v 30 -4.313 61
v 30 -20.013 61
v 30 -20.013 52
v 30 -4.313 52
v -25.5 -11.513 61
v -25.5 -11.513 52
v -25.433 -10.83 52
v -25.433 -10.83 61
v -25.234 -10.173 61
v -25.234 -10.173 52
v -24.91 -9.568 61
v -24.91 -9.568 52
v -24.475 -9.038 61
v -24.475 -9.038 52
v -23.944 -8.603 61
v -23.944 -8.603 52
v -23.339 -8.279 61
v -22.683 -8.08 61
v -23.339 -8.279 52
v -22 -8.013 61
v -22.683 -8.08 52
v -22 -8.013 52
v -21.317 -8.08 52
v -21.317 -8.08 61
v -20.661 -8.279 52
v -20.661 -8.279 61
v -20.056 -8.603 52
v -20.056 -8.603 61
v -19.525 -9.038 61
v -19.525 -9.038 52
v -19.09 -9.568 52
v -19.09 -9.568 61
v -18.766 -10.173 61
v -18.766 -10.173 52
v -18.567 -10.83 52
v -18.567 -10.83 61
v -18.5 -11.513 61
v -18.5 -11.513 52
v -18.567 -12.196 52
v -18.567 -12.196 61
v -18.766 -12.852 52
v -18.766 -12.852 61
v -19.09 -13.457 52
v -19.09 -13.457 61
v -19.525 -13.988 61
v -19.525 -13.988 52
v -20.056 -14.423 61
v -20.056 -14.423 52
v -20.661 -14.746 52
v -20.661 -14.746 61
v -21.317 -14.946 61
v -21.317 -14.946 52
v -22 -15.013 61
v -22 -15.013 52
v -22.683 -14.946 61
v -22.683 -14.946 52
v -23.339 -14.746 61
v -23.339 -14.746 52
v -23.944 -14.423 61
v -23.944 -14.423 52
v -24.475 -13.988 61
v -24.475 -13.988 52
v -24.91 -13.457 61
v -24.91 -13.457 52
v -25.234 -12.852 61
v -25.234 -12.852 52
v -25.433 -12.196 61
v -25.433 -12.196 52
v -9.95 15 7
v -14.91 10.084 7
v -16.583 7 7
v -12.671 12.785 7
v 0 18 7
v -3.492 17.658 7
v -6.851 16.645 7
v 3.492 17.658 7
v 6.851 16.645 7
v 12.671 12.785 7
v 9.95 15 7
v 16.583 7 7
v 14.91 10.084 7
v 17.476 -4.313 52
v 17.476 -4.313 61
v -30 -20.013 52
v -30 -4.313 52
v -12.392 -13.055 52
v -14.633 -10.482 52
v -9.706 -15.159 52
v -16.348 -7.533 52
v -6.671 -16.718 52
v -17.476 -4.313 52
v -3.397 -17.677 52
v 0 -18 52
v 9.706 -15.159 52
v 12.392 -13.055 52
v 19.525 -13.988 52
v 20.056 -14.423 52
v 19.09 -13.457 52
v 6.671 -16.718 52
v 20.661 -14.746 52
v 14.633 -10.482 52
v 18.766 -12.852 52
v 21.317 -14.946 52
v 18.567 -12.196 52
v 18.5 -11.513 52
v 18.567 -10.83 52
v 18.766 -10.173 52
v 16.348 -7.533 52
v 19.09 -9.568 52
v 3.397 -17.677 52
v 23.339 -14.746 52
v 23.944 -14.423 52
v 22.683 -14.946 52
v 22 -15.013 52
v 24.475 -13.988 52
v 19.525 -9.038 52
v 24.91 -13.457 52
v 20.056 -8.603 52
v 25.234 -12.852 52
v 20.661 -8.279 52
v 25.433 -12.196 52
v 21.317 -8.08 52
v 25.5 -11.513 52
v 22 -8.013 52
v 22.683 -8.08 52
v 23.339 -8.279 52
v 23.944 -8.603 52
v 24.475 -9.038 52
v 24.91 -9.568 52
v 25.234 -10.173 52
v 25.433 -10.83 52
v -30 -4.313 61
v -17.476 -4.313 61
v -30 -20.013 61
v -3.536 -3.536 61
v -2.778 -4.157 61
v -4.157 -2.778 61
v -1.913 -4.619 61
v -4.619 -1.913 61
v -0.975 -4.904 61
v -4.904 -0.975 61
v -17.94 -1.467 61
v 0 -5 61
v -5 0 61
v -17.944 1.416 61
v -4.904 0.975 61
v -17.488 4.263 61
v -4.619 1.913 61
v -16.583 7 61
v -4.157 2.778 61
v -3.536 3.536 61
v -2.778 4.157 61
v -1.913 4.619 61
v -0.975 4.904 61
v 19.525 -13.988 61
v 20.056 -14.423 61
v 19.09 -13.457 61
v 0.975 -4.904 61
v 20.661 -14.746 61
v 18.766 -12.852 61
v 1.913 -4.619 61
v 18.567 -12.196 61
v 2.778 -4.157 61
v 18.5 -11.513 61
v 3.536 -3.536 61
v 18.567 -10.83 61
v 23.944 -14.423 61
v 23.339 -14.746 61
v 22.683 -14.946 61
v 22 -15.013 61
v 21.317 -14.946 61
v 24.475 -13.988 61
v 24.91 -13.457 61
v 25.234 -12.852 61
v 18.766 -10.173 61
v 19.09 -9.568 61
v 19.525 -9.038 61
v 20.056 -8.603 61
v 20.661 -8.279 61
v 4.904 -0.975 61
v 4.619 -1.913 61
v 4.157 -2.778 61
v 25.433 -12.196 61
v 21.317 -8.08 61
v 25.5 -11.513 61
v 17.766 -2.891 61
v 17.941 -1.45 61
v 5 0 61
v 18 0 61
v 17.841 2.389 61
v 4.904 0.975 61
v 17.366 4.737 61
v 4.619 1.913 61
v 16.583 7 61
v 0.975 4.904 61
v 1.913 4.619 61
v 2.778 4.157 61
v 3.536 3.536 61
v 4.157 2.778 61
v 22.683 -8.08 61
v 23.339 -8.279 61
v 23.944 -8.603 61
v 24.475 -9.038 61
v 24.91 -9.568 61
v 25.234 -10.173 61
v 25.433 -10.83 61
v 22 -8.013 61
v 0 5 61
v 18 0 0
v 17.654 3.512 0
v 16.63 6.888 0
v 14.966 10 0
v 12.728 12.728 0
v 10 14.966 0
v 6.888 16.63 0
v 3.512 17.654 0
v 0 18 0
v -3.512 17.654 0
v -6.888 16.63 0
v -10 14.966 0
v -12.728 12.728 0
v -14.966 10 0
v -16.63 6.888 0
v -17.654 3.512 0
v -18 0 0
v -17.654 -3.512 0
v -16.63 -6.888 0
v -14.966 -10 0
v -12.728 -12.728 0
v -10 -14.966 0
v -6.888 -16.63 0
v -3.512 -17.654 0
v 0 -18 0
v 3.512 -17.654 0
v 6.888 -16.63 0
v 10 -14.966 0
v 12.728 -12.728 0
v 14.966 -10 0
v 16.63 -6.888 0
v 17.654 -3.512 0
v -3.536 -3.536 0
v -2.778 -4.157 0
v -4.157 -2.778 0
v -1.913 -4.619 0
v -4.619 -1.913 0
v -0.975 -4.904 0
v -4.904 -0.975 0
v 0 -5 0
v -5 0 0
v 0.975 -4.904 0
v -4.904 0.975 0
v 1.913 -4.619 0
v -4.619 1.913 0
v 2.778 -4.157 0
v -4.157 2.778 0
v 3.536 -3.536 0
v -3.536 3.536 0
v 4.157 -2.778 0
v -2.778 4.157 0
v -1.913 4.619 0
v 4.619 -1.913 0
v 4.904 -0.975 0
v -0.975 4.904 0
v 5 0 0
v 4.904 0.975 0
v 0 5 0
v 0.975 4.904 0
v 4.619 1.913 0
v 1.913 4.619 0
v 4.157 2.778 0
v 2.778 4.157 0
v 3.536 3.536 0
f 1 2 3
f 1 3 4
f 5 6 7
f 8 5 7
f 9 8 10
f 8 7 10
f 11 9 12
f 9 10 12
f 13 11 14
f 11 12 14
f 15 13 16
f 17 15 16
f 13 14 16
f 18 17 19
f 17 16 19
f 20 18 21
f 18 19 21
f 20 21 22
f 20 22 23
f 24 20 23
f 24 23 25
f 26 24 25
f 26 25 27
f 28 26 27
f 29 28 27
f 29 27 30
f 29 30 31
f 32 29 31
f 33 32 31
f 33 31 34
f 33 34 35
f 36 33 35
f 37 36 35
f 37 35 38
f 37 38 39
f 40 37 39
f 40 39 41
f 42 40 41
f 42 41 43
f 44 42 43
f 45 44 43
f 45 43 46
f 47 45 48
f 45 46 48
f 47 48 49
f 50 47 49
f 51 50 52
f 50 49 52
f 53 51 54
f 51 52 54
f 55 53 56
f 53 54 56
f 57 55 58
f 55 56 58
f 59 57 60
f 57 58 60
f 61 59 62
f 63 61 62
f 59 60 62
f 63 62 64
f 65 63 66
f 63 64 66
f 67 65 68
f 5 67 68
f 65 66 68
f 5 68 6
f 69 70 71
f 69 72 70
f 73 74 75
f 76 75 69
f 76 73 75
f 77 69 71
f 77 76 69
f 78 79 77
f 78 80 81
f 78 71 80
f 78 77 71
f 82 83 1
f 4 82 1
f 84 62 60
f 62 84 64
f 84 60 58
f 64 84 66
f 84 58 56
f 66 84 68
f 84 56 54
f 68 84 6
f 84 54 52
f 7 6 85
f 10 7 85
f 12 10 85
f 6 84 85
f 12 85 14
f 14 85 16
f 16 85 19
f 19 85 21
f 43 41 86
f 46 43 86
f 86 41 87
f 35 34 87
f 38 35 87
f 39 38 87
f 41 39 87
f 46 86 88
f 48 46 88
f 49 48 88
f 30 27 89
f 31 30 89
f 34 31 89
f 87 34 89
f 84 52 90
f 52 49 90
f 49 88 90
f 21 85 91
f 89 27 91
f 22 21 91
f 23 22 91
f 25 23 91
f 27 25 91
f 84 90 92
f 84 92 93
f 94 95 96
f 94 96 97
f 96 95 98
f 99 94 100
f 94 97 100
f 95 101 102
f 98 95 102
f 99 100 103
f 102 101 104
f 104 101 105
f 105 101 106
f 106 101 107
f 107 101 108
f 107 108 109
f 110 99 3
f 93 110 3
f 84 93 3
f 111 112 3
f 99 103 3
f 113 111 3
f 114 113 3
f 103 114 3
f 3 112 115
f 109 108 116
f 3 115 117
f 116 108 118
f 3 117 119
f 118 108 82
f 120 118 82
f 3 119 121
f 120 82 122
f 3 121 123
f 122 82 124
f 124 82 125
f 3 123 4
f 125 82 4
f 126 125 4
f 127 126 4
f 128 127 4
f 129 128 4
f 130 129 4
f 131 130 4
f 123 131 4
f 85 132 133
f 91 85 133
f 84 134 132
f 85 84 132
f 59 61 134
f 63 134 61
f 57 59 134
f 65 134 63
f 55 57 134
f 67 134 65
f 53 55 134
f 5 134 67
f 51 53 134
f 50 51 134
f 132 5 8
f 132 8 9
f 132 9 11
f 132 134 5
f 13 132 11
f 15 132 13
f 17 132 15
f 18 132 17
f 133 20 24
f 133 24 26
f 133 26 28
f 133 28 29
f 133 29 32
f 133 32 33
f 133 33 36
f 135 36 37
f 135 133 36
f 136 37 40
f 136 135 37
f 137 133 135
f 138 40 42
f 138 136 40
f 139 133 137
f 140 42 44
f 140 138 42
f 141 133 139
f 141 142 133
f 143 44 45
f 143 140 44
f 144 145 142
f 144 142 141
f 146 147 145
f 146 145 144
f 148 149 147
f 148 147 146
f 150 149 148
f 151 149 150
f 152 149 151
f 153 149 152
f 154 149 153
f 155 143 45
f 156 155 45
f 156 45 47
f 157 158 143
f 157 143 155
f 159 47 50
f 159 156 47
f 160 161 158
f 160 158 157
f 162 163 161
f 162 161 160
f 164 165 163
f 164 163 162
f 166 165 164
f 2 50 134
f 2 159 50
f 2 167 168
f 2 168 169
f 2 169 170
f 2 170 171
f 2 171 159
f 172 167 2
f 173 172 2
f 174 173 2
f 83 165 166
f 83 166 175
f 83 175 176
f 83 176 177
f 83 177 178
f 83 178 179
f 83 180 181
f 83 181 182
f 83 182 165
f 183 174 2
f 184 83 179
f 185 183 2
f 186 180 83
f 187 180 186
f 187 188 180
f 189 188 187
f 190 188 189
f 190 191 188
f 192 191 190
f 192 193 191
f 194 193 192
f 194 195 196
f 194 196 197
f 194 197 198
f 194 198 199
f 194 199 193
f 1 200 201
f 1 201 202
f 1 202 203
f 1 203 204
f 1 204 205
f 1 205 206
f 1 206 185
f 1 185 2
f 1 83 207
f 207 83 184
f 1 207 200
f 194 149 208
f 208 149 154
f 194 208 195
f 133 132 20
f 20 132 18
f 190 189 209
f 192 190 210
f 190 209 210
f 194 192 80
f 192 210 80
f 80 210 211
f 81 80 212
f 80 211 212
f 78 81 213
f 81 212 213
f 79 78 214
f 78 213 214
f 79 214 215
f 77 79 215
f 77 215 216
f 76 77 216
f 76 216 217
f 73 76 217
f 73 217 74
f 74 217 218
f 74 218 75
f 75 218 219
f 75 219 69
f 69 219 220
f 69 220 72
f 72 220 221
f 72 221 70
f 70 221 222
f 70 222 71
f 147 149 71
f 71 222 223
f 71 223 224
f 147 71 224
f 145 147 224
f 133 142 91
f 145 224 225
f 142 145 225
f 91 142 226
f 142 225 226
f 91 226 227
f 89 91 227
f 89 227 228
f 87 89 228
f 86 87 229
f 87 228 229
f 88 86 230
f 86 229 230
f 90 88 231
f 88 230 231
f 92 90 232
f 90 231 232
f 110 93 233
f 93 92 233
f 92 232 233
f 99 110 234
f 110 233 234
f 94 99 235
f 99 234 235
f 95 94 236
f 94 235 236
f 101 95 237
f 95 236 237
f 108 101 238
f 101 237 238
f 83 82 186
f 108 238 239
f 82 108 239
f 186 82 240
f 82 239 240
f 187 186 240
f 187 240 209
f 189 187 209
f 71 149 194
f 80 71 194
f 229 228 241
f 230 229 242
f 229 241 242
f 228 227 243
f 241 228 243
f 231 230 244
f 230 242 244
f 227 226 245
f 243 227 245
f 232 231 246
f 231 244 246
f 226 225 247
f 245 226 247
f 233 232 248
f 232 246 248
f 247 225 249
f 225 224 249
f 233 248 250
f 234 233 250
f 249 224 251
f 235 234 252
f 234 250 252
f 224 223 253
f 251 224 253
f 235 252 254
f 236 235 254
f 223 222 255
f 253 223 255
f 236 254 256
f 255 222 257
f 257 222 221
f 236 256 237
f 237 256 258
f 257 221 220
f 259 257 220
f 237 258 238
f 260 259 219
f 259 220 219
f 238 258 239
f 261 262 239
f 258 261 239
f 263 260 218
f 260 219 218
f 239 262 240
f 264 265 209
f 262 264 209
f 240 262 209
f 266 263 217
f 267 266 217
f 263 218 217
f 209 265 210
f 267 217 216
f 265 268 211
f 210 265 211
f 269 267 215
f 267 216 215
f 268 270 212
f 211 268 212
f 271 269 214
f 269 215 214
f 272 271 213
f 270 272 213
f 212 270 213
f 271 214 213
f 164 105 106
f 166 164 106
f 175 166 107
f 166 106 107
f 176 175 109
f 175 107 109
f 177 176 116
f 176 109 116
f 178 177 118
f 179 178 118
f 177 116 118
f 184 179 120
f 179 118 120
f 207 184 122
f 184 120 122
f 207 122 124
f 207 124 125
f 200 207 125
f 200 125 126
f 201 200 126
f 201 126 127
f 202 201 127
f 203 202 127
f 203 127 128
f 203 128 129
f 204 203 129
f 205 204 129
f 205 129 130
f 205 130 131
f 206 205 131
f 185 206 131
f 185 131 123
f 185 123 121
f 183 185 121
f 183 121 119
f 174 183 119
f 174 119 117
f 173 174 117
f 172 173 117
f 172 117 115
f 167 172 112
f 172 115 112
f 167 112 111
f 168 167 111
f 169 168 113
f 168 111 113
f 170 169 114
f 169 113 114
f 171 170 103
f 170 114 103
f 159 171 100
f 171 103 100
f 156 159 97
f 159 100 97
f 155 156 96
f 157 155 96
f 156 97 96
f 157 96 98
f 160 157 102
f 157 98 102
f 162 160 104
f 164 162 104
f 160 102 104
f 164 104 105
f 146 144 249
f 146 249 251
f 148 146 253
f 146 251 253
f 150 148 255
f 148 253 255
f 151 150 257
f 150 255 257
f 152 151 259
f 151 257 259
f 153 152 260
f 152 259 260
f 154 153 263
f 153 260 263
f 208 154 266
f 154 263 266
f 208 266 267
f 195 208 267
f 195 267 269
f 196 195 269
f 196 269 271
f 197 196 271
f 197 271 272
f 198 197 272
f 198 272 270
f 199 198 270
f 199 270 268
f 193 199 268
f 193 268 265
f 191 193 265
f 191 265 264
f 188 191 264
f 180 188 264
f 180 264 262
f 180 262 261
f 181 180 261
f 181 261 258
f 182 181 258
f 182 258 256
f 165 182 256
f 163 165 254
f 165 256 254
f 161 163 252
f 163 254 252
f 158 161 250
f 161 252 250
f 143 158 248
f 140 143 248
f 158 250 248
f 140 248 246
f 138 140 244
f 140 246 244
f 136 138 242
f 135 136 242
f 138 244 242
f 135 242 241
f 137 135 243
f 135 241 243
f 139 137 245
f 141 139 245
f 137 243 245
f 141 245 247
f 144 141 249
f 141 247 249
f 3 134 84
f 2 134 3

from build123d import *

# Parameters (mm, degrees)
SKETCH1_R           = 18
BOSS_EXTRUDE1_DEPTH = 61
SKETCH2_W           = 39.528935746
SKETCH2_H           = 14.130439677
CUT_EXTRUDE1_DEPTH  = 54
SKETCH3_W           = 60
SKETCH3_H           = 15.7
BOSS_EXTRUDE2_DEPTH = 9
SKETCH4_R           = 3.5
CUT_EXTRUDE2_DEPTH  = 10
LPATTERN1_COUNT     = 2
LPATTERN1_PITCH     = 44
SKETCH6_R           = 5
CUT_EXTRUDE3_DEPTH  = 100


with BuildPart() as part:
    # Sketch1 → Boss-Extrude1 (new body)
    with BuildSketch(Plane.XY):
        Circle(SKETCH1_R)
    extrude(amount=BOSS_EXTRUDE1_DEPTH)

    # Sketch2 → Cut-Extrude1 (cut)
    with BuildSketch(Plane.XY.offset(61)):
        with Locations((2.474682956, 14.065219839)):
            Rectangle(SKETCH2_W, SKETCH2_H)
    extrude(amount=-CUT_EXTRUDE1_DEPTH, mode=Mode.SUBTRACT)

    # Sketch3 → Boss-Extrude2 (add)
    with BuildSketch(Plane.XY.offset(61)):
        with Locations((0, -12.16286005)):
            Rectangle(SKETCH3_W, SKETCH3_H)
    extrude(amount=-BOSS_EXTRUDE2_DEPTH)

    # Sketch4 → Cut-Extrude2 (cut)
    with BuildSketch(Plane(origin=(0, 0, 52), x_dir=(-1, 0, 0), z_dir=(0, 0, -1))):
        with Locations((-22, -11.51286005)):
            Circle(SKETCH4_R)
    cut_extrude2 = extrude(amount=-CUT_EXTRUDE2_DEPTH, mode=Mode.SUBTRACT)

    # LPattern1: Cut-Extrude2 ×2
    with Locations(*[(-i * LPATTERN1_PITCH, 0, 0) for i in range(1, LPATTERN1_COUNT)]):
        add(cut_extrude2, mode=Mode.SUBTRACT)

    # Sketch6 → Cut-Extrude3 (cut)
    with BuildSketch(Plane(origin=(0, 0, 0), x_dir=(-1, 0, 0), z_dir=(0, 0, -1))):
        Circle(SKETCH6_R)
    extrude(amount=-CUT_EXTRUDE3_DEPTH, mode=Mode.SUBTRACT)


solid = part.part
